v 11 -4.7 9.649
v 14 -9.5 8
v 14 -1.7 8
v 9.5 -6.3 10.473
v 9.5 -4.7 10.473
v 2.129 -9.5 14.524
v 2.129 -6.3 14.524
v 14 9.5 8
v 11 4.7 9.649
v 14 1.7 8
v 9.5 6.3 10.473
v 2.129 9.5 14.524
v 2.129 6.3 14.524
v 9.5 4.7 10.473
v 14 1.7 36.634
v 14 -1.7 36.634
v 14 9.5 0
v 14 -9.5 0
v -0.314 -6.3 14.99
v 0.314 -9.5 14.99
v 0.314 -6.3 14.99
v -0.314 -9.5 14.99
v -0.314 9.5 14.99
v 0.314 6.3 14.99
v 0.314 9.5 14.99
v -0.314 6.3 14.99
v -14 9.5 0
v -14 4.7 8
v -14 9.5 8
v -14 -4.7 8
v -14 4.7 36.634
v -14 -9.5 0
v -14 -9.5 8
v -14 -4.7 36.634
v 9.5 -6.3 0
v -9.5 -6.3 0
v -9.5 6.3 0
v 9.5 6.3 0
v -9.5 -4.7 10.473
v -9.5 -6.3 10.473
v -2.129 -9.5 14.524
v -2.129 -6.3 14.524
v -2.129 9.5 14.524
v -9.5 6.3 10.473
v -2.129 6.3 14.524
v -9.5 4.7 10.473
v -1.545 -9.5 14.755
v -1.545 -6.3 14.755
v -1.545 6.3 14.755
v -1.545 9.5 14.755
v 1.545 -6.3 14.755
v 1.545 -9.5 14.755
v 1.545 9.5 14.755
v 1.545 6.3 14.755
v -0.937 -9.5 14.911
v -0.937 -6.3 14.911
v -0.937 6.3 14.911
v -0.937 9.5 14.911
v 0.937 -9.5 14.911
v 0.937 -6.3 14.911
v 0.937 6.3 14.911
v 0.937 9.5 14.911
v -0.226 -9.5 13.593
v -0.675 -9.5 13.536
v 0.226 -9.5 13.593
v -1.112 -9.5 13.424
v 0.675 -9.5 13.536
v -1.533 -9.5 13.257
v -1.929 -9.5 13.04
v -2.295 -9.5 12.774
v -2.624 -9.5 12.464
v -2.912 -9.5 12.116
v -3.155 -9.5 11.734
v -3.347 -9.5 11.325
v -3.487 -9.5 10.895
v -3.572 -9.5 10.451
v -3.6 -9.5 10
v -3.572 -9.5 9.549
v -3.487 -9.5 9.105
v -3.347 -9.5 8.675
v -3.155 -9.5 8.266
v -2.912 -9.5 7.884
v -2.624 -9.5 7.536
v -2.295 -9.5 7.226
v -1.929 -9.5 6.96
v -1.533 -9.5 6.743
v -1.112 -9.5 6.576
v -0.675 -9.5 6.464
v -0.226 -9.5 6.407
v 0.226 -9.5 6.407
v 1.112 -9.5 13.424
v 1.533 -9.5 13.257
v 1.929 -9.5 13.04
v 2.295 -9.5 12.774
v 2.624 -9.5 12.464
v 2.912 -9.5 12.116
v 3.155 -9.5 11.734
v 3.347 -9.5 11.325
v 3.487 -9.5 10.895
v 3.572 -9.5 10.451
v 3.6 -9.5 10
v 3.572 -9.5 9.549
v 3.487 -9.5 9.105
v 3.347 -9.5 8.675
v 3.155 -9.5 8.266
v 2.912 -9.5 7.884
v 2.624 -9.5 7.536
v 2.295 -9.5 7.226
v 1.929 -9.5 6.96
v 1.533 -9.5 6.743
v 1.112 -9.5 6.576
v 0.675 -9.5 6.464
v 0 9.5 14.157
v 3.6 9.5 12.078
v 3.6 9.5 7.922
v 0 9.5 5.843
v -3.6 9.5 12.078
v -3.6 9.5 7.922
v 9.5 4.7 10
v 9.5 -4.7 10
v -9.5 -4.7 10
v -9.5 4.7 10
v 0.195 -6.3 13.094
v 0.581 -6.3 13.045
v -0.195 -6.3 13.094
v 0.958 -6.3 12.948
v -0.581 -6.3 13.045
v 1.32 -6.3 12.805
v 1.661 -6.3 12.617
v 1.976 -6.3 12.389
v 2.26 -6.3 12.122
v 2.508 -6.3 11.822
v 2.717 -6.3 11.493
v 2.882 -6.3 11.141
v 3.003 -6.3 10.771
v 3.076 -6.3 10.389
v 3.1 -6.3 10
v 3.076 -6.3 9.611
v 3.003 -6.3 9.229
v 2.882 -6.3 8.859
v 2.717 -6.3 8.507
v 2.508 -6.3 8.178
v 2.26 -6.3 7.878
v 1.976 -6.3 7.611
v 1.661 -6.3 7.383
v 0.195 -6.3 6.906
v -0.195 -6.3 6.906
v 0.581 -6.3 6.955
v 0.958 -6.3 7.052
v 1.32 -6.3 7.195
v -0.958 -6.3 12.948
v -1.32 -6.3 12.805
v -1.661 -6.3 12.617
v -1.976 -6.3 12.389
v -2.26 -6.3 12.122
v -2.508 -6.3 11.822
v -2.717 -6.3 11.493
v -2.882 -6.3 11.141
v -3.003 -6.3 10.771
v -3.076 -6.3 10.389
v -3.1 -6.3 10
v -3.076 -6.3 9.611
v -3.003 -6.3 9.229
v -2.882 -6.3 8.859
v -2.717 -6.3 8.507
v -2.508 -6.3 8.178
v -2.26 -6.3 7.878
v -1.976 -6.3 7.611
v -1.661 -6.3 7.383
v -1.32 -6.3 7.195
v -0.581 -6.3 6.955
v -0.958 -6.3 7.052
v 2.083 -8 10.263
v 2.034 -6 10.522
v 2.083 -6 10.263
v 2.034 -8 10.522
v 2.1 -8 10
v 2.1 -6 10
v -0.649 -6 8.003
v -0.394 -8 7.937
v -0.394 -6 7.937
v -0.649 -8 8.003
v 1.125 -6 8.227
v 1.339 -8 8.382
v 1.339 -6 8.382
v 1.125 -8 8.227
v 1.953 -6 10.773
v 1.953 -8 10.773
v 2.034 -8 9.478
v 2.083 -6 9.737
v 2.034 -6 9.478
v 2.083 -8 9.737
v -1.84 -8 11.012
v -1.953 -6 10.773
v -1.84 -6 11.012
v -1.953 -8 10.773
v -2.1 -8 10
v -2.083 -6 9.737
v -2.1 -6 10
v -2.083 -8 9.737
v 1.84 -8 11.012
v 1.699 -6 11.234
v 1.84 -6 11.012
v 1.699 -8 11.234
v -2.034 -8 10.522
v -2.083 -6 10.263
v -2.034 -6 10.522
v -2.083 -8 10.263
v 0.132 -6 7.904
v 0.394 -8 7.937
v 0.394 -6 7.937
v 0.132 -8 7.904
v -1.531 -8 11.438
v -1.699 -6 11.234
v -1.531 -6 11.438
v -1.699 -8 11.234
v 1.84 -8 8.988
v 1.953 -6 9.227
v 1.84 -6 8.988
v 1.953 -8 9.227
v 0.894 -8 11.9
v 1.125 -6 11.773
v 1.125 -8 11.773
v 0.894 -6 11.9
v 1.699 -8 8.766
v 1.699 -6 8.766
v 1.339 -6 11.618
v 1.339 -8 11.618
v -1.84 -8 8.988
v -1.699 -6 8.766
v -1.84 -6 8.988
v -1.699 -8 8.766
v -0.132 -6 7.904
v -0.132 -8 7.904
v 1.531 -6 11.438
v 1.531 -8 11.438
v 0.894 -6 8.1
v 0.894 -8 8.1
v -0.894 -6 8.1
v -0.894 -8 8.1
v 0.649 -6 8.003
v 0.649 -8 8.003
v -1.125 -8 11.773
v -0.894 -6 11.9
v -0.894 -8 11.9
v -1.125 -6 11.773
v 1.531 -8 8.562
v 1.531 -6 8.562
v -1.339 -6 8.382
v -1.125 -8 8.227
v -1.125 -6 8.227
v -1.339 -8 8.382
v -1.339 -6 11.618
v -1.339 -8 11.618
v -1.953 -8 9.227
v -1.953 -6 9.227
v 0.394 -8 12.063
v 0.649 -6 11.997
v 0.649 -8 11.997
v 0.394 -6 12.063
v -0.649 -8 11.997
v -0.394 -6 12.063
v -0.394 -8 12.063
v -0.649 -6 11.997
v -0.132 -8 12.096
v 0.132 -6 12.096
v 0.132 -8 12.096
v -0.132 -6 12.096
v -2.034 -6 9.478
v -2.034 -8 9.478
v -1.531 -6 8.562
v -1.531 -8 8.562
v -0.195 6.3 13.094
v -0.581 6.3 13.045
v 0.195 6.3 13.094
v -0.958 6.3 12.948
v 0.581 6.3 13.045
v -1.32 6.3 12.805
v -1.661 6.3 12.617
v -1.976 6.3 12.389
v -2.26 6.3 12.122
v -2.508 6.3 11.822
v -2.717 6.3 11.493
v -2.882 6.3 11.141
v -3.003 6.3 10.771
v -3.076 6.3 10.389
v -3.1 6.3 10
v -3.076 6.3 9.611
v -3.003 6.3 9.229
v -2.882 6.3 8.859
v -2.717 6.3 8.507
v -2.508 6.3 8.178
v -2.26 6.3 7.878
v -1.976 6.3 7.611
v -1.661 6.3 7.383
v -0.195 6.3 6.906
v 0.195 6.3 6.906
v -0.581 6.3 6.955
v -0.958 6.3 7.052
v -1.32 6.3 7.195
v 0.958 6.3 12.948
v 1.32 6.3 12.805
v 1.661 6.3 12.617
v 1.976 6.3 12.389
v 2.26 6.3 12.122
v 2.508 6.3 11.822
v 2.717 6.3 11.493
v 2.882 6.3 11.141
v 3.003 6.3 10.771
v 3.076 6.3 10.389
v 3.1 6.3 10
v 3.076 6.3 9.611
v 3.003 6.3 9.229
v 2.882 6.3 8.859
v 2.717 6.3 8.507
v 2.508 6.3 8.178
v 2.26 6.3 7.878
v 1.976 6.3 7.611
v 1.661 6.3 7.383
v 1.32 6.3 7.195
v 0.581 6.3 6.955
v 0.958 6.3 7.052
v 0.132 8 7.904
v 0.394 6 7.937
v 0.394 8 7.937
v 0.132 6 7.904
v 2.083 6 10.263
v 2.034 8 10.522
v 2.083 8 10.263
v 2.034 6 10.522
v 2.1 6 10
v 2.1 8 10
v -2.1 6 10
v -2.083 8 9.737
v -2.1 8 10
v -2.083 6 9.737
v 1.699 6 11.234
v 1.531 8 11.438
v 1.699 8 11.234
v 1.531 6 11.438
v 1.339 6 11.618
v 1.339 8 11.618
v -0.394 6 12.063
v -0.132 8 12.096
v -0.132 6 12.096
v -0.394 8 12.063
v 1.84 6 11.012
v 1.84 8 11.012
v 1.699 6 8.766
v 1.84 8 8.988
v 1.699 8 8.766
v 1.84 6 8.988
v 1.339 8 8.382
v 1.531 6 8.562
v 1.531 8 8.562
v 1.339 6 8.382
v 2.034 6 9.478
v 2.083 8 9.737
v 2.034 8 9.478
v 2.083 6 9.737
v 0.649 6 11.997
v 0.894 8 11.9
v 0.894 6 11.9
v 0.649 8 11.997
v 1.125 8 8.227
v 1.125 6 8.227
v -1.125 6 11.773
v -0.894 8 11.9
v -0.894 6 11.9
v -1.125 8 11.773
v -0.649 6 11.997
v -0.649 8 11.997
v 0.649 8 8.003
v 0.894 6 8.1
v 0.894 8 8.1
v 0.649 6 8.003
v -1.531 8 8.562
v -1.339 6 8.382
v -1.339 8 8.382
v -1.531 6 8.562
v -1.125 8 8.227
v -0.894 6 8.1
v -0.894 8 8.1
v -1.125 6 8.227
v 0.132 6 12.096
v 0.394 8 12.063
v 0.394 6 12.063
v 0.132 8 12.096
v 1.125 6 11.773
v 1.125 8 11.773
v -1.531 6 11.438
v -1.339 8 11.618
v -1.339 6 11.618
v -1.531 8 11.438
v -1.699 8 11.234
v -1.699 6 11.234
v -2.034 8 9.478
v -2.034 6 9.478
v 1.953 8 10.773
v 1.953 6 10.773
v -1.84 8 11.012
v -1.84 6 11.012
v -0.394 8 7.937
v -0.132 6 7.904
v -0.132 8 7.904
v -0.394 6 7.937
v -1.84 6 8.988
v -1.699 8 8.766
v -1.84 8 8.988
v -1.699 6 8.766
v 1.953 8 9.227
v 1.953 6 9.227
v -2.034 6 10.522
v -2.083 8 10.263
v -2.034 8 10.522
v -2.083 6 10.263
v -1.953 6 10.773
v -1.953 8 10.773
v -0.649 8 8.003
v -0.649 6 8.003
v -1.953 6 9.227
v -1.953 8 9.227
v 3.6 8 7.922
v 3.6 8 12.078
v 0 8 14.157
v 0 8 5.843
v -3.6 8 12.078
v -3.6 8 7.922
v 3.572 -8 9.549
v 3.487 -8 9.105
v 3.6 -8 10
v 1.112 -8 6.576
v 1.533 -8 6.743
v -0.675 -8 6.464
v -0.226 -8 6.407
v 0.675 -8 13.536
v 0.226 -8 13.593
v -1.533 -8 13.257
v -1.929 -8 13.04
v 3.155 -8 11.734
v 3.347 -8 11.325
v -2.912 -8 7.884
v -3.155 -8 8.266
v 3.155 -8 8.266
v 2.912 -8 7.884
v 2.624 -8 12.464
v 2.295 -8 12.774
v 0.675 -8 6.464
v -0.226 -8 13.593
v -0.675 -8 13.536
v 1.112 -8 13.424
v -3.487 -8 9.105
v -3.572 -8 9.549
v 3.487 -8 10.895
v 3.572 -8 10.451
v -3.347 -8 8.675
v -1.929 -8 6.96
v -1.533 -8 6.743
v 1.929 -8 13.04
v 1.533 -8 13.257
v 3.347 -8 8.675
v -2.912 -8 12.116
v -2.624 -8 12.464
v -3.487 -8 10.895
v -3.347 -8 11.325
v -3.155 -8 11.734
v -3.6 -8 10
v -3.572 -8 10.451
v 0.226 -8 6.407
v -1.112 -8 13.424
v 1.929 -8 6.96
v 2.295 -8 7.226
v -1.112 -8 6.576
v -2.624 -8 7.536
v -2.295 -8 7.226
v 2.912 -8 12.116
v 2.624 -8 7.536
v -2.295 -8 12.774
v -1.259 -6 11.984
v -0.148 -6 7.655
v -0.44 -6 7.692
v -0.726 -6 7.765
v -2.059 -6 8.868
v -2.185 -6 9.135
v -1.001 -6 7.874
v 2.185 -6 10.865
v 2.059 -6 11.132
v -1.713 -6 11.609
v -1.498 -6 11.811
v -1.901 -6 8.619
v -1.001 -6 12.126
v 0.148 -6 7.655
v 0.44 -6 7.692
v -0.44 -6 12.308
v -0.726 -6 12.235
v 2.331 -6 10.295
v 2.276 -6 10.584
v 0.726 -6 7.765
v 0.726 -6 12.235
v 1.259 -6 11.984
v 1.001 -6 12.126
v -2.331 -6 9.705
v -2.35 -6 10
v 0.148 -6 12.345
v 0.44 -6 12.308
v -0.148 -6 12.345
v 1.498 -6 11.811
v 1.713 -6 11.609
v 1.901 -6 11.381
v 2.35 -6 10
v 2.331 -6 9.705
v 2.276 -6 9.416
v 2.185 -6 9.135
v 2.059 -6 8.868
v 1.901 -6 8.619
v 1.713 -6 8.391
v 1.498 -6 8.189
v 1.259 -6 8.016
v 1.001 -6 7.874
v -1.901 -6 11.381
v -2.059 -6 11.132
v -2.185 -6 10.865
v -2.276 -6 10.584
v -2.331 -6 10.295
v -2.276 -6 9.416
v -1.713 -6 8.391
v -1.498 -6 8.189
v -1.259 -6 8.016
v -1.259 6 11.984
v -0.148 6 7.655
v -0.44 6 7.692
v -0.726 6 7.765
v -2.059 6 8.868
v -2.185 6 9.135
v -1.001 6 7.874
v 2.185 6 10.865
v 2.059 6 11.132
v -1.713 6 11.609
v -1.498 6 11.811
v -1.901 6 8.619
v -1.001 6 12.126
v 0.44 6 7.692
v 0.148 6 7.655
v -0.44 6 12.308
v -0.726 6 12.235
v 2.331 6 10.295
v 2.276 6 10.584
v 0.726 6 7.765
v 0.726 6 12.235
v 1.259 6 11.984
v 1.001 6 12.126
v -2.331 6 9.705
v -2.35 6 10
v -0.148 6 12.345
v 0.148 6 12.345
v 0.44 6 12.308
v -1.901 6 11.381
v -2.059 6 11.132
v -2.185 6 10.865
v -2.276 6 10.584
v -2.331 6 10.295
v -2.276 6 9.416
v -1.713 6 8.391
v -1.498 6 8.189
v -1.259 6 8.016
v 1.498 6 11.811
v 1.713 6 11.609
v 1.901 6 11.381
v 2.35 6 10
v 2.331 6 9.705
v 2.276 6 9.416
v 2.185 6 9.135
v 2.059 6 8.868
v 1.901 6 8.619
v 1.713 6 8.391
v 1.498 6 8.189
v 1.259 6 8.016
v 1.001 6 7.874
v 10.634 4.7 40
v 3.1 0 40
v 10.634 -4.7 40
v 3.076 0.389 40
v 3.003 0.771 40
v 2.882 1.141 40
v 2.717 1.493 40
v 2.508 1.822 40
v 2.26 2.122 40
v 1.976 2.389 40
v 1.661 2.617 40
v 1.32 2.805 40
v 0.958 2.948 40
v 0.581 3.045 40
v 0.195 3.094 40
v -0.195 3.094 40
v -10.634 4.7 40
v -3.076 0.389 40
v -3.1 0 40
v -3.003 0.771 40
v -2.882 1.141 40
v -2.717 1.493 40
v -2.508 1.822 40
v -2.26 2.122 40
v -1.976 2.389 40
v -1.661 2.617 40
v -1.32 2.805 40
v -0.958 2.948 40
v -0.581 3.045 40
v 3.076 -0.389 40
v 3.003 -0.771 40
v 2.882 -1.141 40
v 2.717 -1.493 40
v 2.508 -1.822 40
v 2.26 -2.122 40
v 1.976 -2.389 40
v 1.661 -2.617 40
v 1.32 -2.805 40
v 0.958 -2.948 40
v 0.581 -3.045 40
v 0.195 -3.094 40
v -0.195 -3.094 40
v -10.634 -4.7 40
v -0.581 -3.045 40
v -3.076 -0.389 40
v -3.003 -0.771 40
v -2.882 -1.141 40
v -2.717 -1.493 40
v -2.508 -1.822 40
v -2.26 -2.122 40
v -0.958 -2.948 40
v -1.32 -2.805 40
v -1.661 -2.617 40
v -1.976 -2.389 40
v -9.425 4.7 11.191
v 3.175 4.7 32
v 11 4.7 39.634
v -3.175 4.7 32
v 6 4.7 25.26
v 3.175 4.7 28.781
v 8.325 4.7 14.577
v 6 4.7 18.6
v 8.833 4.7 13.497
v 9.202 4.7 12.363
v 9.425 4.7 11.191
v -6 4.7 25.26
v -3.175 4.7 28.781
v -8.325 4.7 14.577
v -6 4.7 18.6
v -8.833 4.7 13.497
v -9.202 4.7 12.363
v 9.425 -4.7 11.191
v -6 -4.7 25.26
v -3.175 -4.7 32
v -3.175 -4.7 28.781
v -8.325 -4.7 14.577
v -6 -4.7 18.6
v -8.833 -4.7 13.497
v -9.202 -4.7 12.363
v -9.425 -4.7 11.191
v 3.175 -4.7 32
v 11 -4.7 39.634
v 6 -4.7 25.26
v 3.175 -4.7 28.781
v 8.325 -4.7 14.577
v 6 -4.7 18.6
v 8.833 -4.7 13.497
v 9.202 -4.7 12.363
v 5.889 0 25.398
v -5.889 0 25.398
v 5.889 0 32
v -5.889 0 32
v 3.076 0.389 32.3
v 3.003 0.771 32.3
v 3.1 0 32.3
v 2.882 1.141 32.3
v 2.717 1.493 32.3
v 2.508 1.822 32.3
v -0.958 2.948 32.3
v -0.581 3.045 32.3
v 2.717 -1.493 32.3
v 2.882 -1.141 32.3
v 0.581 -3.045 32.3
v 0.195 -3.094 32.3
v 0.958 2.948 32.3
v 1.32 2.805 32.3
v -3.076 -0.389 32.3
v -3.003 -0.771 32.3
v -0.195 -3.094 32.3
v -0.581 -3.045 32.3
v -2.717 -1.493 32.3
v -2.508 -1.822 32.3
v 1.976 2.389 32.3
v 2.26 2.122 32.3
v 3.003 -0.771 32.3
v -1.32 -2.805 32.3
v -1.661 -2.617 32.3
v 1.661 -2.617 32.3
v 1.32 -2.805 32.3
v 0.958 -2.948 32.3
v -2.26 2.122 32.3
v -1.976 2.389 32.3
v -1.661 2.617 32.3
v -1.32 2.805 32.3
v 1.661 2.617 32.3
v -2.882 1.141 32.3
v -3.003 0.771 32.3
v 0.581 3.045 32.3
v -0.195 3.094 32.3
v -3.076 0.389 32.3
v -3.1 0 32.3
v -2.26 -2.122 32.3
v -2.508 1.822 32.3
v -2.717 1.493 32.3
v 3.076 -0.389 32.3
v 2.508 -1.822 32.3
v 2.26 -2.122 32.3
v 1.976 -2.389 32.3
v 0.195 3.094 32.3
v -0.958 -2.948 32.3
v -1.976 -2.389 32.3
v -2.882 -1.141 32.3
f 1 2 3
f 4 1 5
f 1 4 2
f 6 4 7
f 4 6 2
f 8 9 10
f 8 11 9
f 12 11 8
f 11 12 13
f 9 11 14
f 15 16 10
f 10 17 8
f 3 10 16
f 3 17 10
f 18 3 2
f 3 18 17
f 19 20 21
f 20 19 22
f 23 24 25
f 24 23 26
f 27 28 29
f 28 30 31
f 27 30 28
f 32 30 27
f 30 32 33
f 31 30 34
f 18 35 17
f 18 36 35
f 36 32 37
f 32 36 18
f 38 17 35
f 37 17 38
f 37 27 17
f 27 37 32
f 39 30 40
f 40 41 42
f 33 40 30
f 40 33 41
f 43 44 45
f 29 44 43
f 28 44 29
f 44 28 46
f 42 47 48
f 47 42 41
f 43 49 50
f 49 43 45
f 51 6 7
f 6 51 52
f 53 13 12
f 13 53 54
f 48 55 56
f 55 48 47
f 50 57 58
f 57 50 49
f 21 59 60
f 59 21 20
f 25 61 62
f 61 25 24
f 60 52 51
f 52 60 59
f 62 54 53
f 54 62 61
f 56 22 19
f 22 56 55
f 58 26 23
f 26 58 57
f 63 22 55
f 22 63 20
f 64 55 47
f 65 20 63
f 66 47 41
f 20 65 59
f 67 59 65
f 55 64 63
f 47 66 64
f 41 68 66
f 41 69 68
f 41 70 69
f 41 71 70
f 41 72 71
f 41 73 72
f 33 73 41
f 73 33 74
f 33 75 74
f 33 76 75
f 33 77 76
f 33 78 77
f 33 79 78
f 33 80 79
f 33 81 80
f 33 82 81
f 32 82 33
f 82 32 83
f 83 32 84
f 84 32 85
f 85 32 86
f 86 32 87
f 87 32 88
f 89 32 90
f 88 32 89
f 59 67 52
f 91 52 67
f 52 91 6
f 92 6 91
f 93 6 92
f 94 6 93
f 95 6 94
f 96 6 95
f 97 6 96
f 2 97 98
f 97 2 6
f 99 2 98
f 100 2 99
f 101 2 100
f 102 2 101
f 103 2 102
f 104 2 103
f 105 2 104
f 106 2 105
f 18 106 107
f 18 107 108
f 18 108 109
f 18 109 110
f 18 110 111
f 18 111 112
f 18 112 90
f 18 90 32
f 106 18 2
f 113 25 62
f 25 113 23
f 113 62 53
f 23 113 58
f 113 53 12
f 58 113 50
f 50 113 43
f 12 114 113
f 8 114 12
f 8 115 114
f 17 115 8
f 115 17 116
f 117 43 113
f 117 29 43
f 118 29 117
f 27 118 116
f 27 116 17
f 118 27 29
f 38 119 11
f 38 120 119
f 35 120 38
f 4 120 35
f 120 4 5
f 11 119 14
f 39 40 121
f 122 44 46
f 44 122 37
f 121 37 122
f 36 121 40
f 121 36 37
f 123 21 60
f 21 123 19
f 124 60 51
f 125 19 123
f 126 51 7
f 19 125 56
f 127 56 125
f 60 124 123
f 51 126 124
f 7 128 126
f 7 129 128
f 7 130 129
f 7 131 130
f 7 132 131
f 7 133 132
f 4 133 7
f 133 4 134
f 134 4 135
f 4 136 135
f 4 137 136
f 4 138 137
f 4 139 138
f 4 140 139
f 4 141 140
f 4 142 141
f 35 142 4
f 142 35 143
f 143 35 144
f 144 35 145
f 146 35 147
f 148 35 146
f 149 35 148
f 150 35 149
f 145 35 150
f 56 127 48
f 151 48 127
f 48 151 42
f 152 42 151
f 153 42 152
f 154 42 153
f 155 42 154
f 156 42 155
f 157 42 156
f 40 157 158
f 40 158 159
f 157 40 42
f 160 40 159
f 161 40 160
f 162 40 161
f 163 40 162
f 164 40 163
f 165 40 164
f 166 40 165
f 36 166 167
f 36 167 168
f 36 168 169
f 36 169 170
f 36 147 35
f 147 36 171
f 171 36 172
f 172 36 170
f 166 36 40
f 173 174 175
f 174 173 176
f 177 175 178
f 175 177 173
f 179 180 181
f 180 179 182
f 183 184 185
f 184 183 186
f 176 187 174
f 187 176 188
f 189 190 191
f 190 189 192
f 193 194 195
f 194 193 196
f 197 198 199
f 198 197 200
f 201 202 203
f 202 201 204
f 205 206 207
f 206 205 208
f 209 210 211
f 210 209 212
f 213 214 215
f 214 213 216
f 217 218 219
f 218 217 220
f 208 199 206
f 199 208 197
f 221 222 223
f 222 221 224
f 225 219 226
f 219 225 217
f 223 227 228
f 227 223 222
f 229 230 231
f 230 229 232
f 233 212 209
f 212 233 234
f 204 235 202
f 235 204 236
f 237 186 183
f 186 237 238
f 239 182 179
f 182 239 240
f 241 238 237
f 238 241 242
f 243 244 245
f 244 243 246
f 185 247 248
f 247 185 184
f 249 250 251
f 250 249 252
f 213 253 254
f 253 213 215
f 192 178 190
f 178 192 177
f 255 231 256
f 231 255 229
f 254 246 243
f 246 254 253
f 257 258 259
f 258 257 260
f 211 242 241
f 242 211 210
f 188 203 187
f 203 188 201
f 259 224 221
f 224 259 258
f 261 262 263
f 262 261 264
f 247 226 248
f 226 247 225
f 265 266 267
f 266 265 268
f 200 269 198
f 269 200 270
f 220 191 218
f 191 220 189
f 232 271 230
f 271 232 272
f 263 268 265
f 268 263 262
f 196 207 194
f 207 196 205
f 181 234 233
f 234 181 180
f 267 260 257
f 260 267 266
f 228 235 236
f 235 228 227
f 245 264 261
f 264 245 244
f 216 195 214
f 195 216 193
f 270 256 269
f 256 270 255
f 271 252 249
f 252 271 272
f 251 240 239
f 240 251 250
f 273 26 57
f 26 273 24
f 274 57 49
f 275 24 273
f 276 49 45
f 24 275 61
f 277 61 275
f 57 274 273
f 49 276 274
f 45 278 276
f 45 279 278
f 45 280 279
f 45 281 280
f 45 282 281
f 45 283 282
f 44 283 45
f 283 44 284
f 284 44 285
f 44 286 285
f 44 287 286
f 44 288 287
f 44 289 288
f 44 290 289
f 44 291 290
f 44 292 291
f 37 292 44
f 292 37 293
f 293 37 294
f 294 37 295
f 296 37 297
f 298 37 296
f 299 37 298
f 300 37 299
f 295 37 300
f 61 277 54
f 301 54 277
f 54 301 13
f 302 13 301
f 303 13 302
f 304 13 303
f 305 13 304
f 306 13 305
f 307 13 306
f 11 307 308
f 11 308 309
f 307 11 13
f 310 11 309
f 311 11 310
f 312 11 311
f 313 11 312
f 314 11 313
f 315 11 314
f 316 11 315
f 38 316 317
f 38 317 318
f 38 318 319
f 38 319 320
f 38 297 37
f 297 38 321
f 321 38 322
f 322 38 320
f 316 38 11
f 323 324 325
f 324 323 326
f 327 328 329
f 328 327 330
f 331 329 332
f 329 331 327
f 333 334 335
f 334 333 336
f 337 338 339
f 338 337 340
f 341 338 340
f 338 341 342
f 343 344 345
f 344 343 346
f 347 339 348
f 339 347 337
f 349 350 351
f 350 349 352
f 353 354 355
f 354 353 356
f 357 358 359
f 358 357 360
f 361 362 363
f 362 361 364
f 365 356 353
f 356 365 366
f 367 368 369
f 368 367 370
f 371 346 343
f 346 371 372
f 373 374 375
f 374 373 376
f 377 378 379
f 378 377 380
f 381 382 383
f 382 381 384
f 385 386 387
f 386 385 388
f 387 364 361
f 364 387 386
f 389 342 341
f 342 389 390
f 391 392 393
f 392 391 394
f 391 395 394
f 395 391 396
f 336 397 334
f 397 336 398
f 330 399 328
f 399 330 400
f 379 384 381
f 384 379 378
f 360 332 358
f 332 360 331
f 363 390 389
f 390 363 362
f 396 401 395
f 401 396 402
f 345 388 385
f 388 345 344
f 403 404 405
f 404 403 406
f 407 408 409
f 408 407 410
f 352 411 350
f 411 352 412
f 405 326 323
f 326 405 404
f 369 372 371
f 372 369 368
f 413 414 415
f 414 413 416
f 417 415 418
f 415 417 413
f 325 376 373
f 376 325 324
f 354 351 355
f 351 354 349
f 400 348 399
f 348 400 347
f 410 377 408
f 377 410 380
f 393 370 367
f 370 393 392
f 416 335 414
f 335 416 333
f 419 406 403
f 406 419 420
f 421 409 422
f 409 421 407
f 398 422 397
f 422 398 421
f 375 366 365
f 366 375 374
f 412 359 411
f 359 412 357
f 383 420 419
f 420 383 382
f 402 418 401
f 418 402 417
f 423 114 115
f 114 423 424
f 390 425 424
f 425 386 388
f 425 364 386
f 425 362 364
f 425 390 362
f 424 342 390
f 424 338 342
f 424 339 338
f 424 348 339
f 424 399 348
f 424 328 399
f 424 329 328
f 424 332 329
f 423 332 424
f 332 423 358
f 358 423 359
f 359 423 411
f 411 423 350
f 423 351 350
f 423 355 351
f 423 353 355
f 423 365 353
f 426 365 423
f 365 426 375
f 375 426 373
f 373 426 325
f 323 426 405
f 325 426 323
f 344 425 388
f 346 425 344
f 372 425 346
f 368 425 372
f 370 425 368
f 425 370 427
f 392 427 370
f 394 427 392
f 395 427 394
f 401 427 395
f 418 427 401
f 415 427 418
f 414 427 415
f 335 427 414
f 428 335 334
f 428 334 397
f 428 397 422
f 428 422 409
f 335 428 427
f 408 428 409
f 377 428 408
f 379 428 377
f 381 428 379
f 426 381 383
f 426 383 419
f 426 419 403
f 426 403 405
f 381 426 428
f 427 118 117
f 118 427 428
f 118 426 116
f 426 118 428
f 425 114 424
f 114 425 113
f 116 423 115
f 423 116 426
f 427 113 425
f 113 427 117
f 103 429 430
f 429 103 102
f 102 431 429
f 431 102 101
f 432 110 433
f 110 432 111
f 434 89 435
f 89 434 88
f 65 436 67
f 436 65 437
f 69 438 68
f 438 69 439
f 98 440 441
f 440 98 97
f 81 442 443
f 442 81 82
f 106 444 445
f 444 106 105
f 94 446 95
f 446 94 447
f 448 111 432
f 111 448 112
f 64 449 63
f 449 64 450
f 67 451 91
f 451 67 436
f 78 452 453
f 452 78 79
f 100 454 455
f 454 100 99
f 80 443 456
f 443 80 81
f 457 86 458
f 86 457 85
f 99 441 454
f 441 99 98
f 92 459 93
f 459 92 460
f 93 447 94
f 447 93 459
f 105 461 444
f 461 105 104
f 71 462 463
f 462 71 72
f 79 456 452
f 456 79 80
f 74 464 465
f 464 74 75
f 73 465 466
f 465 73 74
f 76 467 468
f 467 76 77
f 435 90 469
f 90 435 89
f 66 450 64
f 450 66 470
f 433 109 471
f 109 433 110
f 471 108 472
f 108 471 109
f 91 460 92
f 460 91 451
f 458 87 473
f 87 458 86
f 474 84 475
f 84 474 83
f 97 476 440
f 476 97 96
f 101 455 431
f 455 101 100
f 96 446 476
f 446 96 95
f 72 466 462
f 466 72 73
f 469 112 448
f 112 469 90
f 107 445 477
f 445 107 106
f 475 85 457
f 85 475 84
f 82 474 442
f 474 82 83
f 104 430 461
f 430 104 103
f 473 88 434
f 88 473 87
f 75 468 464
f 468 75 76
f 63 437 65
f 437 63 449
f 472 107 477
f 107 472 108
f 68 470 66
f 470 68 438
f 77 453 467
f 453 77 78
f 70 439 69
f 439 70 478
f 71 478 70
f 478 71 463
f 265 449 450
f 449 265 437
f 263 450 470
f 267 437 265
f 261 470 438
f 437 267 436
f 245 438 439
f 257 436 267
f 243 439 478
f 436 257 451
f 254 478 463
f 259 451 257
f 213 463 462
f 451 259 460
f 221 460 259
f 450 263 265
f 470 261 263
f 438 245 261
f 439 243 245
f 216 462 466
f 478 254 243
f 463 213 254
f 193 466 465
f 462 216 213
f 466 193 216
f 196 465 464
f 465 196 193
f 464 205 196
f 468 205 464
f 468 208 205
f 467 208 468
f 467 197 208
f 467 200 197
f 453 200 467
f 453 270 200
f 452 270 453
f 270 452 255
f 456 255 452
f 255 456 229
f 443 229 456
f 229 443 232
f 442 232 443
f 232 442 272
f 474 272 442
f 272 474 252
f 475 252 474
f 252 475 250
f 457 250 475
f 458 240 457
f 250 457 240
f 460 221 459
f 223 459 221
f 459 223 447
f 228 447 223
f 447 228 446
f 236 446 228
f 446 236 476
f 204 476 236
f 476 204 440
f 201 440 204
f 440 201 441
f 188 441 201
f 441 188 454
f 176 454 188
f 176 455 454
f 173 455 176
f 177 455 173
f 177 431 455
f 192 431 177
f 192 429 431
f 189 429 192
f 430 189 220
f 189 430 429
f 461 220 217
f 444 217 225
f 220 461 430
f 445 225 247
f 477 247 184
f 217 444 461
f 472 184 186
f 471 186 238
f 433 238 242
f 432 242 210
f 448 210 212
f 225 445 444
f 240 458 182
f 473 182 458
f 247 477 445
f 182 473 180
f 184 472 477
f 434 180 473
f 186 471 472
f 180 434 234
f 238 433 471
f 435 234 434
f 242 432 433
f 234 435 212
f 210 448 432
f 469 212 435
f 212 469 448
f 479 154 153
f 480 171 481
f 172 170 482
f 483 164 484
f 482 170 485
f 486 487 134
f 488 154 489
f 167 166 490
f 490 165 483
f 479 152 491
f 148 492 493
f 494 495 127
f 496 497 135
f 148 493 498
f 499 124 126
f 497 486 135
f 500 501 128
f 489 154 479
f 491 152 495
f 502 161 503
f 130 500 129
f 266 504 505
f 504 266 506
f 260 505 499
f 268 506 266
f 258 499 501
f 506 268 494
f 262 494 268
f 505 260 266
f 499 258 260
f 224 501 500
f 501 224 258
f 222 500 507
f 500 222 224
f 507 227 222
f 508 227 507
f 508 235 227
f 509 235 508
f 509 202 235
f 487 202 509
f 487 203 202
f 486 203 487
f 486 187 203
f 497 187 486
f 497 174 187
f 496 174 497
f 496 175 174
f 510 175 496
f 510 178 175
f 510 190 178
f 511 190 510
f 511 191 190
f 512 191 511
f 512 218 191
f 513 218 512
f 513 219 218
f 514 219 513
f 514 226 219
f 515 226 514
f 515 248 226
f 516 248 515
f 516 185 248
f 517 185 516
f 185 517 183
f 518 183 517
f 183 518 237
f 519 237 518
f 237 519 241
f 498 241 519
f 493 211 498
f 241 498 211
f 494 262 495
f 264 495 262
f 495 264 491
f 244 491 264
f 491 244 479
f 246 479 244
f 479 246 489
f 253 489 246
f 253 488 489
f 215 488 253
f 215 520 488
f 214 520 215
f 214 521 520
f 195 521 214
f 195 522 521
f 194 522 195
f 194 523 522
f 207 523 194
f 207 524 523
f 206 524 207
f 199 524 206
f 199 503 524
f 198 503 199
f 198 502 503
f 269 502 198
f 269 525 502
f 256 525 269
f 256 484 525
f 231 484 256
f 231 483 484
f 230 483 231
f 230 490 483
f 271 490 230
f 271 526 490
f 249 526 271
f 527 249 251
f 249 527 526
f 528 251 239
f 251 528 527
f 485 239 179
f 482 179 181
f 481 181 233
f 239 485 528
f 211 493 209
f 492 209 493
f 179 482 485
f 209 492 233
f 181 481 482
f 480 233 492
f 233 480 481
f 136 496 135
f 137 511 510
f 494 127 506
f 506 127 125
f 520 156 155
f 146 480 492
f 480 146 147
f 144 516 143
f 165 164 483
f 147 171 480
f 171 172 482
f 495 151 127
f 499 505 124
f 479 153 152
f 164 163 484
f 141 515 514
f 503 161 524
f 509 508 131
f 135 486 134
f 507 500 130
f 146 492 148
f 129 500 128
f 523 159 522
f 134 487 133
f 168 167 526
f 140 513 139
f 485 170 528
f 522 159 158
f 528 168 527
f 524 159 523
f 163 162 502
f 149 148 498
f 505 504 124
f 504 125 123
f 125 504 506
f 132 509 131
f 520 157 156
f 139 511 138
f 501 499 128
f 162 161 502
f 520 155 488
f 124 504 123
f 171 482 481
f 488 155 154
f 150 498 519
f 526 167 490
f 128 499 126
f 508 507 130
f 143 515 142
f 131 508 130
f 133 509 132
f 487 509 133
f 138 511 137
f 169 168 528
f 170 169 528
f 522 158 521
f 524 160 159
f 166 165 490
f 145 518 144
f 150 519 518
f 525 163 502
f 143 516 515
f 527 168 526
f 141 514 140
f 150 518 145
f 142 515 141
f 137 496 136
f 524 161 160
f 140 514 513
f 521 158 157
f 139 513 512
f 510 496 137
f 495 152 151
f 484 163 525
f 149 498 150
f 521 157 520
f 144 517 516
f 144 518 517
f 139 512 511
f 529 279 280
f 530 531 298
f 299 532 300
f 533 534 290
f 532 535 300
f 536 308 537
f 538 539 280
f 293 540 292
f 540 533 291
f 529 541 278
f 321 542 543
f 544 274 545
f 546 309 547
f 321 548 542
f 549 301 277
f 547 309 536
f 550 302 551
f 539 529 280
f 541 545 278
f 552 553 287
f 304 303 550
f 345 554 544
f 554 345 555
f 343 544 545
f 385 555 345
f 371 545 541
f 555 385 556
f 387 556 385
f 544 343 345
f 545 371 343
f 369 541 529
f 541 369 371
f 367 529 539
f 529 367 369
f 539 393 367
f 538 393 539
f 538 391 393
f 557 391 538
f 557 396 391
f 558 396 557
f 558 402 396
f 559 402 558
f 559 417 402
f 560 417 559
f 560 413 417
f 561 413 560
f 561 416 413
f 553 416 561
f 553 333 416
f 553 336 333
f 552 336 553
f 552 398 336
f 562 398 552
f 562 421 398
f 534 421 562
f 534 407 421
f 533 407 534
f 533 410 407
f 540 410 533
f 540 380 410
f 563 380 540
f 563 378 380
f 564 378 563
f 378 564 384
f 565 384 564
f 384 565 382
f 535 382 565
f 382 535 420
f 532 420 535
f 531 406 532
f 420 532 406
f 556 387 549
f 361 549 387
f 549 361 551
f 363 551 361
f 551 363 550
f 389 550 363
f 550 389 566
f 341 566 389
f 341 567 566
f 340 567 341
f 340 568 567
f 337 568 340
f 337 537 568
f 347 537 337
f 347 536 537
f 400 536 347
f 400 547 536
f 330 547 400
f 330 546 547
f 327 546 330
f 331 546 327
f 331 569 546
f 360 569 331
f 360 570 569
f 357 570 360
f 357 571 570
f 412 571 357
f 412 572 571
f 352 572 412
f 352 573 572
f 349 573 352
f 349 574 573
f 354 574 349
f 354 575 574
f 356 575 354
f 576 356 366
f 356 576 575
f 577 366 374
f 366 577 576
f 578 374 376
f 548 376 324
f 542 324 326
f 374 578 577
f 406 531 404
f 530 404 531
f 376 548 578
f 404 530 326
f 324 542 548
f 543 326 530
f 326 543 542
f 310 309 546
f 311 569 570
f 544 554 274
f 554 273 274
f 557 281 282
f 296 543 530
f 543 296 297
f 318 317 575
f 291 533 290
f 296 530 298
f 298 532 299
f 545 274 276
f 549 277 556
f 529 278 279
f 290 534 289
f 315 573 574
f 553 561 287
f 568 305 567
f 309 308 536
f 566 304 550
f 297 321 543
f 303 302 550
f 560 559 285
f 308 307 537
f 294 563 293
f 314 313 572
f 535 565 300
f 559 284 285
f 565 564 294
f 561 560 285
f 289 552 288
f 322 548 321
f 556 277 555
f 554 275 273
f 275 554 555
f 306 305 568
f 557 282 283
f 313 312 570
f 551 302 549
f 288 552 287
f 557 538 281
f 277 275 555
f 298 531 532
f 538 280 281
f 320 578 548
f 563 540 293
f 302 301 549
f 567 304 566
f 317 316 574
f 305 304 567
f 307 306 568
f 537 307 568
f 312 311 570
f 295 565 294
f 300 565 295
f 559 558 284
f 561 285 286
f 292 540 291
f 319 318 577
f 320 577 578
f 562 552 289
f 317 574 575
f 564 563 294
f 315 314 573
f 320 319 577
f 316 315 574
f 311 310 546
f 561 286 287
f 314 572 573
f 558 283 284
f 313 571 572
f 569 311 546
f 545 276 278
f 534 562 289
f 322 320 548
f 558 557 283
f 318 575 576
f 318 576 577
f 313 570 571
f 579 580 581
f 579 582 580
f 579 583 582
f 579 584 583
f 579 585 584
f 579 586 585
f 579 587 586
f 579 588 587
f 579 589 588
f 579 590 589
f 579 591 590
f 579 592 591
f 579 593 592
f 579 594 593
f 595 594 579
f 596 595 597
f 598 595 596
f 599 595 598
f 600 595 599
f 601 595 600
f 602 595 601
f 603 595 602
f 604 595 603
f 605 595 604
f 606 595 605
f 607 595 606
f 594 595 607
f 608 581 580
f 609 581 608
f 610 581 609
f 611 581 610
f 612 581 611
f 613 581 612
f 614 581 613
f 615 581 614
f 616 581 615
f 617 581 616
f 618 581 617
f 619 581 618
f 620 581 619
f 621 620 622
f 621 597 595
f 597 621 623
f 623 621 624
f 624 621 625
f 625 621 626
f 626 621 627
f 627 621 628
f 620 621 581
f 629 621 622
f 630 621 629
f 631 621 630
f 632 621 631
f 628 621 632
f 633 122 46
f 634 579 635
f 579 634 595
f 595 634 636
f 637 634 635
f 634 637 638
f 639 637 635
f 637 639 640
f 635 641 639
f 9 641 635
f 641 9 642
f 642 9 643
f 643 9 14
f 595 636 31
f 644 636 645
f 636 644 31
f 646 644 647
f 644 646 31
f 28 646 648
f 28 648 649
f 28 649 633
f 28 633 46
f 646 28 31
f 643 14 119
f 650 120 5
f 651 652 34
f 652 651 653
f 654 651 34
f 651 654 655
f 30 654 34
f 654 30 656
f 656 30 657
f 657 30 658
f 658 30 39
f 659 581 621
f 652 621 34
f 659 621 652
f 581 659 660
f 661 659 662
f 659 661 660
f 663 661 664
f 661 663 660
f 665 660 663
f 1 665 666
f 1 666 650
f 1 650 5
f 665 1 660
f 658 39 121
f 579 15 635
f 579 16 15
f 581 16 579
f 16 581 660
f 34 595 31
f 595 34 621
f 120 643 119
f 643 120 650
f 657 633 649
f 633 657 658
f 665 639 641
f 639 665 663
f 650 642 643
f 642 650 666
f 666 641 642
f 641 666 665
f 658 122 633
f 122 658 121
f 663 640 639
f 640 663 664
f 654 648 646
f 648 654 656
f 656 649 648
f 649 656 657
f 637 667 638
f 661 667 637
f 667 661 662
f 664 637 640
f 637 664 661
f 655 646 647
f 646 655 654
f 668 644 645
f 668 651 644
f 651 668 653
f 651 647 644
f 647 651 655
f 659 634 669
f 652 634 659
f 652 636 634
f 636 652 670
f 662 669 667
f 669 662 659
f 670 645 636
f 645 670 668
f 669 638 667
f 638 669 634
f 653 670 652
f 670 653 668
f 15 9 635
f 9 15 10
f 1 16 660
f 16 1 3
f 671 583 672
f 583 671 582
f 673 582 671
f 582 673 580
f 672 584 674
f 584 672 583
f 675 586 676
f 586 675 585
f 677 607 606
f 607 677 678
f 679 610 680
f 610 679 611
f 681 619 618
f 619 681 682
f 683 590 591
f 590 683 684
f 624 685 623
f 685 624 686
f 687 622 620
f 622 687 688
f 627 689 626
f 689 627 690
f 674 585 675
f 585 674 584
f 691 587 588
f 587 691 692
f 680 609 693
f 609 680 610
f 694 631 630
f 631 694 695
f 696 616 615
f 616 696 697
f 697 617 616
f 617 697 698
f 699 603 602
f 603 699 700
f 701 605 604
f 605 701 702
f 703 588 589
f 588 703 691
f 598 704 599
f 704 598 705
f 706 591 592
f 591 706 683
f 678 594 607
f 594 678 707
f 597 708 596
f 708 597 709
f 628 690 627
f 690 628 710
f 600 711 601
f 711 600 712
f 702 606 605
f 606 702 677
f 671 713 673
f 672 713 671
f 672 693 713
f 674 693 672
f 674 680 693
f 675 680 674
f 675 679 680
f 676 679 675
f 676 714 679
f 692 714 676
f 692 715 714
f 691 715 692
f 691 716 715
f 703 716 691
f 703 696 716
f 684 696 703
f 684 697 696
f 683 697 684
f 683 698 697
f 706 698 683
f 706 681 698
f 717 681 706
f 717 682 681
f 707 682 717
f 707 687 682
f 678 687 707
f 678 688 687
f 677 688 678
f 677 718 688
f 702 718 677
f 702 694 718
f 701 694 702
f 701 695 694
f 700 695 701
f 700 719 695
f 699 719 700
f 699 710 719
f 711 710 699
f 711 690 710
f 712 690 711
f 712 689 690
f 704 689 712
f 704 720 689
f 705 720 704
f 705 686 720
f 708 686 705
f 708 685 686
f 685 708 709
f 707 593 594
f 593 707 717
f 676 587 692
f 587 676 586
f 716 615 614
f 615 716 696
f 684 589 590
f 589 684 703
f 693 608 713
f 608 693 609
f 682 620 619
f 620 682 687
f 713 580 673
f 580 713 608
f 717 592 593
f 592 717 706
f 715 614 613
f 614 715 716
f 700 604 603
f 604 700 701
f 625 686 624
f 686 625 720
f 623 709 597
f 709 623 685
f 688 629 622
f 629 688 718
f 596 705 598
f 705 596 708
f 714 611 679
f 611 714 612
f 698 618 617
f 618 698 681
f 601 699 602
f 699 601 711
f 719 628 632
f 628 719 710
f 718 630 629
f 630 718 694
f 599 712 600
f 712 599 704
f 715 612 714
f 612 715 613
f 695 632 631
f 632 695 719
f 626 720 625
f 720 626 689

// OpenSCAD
// file: PowerCode_Config.scad
// Global configuration file of PowerCode
// By J.Rodigo (www.jrodrigo.net)
// Licence Creative commons atribution & share alike.
// Author: Mecano ( https://github.com/Mecan0/Code )

//*************************************************//
//       Parámetros de configuración global        //
//*************************************************//

// Resolución de las superficies curvas
$fn = 100 ;		

// Cojinetes Lineales
dCoLi = 15 ;	// Diámetro LM8UU(15) IGUS(16)

// Varillas lisas
dVaLi = 8.15 ; // Diámetro




//*************************************************//
//              Módulos de uso global              //
//*************************************************//

// Generar un hexágono circunscrito (Diámetro,altura) 
module hexagono(d,h){ 
	for (a = [0, 60,120]){ 
		rotate( a, [0, 0, 1])
		cube([d, d*tan(30), h], center = true);
	}
}

// Generar un cuadrado/chaflán a 45º (Arista,Altura,Giro{0 = 45º, 1 = 135º, ...}) 
module chamfer(a,h,g){ 
	rotate( g*90 + 45 , [0, 0, 1])
	cube([a, a, h]);
}
// main file
// Created from Code_Xend_Idler_B_623_M6.stl
// https://github.com/Mecan0/Code
// By J.Rodigo (www.jodrigo.net)
// Licence Creative commons atribution & share alike.

include <PowerCode_Config.scad>;

$fn = 50;

/**************************/
// Parámetros de la pieza  /
/**************************/

dTor = 6.2 ; 	// Diámetro del tornillo del tensor (6.2)

// Los dos taladros del soporte para el tornillo de la polea
dToSo = 4.2 ;	// Diámetro del taladro (3.3)
dToCh = 7.2 ; 	// Diámetro del zócalo (6)
dToTu = 7.2 ; 	// Tamaño de la tuerca (5.8)

// Tuerca del tensor
hTuTen = 10.2 ;		// Distancia entre caras de la tuerca (10.2)

// Polea
pulley = 12.6/2 ;			// Anchura de la polea
pulleywasher = true ;	// Mini saliente para fijar la polea sin arandelas

// Creamos la mitad de la base
module mbase(){
	// Redondeo y chaflan mediante el comando hull
	hull(){
		// Bloque de la base
		translate([-14, -9.5, 0])
		cube([28, 9.5, 8]);
		// Redondeo superior 
		translate([0, 0, 10])
		rotate( 90, [1, 0, 0])
		cylinder(h = 9.5, r = 5);	
	}
}

// Operaciones para la media base
module mbaseope(){
	// Vaciado interior
	translate([-9.5, -pulley, -1])
	cube([19, pulley+1, 17]);
	// Taladro para el tornillo
	translate([0, -5, 10])
	rotate( 90, [1, 0, 0])
	cylinder(h = 5, r = dToSo/2);
}

module pwasher(){
	if (pulleywasher == true){
		difference(){
			union(){
				hull(){
					// Washer
					translate([0, -pulley, 10])
					rotate( -90, [1, 0, 0])
					cylinder(h = 0.3, r = (dToSo+0.5)/2);
					// Redondeo superior 
					translate([0, -pulley, 10])
					rotate( 90, [1, 0, 0])
					cylinder(h = 0.1, r = (dToSo+2)/2);
				}
			}
			union(){
				// Taladro para el tornillo
				translate([0, -5, 10])
				rotate( 90, [1, 0, 0])
				cylinder(h = 5, r = dToSo/2);
			}
		}
	}
}

// Base de la pieza
module base(){
	difference(){
		union(){
			// Media base en -Y 
			mbase();
			// Media base en +Y
			mirror([ 0, 1, 0 ])
			mbase();
		}
		union(){
			// Media parte de las operaciones en -Y 
			mbaseope();
			// Media parte de las operaciones en +Y 
			mirror([ 0, 1, 0 ])
			mbaseope();
			// Zócalo para la cabeza del tornillo
			translate([0, 9.5, 10])
			rotate( 90, [1, 0, 0])
			hexagono(dToTu,3);
			// Zócalo para la tuerca
			translate([0, -10, 10])
			rotate( -90, [1, 0, 0])
			cylinder(h = 2, r = dToCh/2);
		}
	}
	// Saliente para el enclavamiento de al polea
	pwasher();
	mirror([ 0, 1, 0 ])pwasher();
}

// Medio soporte
module msoporte(){
	difference(){
		// Bloque principal del soporte
		translate([0, -4.7, 0])
		cube([14, 9.4, 40]);
		// Chaflán superior del soporte
		translate([10.634, -6, 40])
		rotate( 45 , [0, 1, 0])
		cube([5, 12, 5]);
	}
}

module msoporteope(){
	// Parte inferior redondeada
	hull(){
		// Bloque inferior
		translate([-1, -6, -1])
		cube([10.5, 12, 10]);
		// Redondeo interior 
		translate([0, 6, 10])
		rotate( 90, [1, 0, 0])
		cylinder(h = 12, r = 9.5);	
		// Bloque del medio
		translate([-1, -6, 17.6])
		cube([7, 12, 1]);
	}
	// Parte superior con chaflán
	hull(){
		// Bloque del medio
		translate([-1, -6, -1])
		cube([7, 12, 31.26-5]);
		// Bloque superior
		translate([-1, -6, 31-3])
		cube([6-2, 12, 1]);
	}
	
}

//Alojamiento para el tornillo del tensor
module tornillotensor(){
			rotate( 90, [0, 0, 1])
			translate([0, 0, 28])
			hexagono(hTuTen,8);
}

// Base de la pieza
module soporte(){
	difference(){
		union(){
			// Medio soporte en +X 
			msoporte();
			// Medio soporte en -X 
			mirror([ 1, 0, 0 ])
			msoporte();
		}
		union(){
			// Media parte de las operaciones en +X
			msoporteope();
			// Chaflanes a lo largo del eje Z
			translate([14, 1.7, 0])
			chamfer(5,41,0);
			translate([14, -1.7, 0])
			chamfer(5,41,2);
			// Media parte de las operaciones en -X 
			mirror([ 1, 0, 0 ])
			msoporteope();
			// Alojamiento del tornillo tensor
			tornillotensor();
			// Taladro superior para el tensado
			translate([0, 0, 32 + 0.3]) // Se añade un 0.3 para poder imprimir el puente
			cylinder(h = 10, r = dTor/2);
		}
	}
}

// Unimos la base y el soporte para crear la pieza
module pieza(){
	base();
	soporte();
}

// Generamos la pieza!!

	pieza();
